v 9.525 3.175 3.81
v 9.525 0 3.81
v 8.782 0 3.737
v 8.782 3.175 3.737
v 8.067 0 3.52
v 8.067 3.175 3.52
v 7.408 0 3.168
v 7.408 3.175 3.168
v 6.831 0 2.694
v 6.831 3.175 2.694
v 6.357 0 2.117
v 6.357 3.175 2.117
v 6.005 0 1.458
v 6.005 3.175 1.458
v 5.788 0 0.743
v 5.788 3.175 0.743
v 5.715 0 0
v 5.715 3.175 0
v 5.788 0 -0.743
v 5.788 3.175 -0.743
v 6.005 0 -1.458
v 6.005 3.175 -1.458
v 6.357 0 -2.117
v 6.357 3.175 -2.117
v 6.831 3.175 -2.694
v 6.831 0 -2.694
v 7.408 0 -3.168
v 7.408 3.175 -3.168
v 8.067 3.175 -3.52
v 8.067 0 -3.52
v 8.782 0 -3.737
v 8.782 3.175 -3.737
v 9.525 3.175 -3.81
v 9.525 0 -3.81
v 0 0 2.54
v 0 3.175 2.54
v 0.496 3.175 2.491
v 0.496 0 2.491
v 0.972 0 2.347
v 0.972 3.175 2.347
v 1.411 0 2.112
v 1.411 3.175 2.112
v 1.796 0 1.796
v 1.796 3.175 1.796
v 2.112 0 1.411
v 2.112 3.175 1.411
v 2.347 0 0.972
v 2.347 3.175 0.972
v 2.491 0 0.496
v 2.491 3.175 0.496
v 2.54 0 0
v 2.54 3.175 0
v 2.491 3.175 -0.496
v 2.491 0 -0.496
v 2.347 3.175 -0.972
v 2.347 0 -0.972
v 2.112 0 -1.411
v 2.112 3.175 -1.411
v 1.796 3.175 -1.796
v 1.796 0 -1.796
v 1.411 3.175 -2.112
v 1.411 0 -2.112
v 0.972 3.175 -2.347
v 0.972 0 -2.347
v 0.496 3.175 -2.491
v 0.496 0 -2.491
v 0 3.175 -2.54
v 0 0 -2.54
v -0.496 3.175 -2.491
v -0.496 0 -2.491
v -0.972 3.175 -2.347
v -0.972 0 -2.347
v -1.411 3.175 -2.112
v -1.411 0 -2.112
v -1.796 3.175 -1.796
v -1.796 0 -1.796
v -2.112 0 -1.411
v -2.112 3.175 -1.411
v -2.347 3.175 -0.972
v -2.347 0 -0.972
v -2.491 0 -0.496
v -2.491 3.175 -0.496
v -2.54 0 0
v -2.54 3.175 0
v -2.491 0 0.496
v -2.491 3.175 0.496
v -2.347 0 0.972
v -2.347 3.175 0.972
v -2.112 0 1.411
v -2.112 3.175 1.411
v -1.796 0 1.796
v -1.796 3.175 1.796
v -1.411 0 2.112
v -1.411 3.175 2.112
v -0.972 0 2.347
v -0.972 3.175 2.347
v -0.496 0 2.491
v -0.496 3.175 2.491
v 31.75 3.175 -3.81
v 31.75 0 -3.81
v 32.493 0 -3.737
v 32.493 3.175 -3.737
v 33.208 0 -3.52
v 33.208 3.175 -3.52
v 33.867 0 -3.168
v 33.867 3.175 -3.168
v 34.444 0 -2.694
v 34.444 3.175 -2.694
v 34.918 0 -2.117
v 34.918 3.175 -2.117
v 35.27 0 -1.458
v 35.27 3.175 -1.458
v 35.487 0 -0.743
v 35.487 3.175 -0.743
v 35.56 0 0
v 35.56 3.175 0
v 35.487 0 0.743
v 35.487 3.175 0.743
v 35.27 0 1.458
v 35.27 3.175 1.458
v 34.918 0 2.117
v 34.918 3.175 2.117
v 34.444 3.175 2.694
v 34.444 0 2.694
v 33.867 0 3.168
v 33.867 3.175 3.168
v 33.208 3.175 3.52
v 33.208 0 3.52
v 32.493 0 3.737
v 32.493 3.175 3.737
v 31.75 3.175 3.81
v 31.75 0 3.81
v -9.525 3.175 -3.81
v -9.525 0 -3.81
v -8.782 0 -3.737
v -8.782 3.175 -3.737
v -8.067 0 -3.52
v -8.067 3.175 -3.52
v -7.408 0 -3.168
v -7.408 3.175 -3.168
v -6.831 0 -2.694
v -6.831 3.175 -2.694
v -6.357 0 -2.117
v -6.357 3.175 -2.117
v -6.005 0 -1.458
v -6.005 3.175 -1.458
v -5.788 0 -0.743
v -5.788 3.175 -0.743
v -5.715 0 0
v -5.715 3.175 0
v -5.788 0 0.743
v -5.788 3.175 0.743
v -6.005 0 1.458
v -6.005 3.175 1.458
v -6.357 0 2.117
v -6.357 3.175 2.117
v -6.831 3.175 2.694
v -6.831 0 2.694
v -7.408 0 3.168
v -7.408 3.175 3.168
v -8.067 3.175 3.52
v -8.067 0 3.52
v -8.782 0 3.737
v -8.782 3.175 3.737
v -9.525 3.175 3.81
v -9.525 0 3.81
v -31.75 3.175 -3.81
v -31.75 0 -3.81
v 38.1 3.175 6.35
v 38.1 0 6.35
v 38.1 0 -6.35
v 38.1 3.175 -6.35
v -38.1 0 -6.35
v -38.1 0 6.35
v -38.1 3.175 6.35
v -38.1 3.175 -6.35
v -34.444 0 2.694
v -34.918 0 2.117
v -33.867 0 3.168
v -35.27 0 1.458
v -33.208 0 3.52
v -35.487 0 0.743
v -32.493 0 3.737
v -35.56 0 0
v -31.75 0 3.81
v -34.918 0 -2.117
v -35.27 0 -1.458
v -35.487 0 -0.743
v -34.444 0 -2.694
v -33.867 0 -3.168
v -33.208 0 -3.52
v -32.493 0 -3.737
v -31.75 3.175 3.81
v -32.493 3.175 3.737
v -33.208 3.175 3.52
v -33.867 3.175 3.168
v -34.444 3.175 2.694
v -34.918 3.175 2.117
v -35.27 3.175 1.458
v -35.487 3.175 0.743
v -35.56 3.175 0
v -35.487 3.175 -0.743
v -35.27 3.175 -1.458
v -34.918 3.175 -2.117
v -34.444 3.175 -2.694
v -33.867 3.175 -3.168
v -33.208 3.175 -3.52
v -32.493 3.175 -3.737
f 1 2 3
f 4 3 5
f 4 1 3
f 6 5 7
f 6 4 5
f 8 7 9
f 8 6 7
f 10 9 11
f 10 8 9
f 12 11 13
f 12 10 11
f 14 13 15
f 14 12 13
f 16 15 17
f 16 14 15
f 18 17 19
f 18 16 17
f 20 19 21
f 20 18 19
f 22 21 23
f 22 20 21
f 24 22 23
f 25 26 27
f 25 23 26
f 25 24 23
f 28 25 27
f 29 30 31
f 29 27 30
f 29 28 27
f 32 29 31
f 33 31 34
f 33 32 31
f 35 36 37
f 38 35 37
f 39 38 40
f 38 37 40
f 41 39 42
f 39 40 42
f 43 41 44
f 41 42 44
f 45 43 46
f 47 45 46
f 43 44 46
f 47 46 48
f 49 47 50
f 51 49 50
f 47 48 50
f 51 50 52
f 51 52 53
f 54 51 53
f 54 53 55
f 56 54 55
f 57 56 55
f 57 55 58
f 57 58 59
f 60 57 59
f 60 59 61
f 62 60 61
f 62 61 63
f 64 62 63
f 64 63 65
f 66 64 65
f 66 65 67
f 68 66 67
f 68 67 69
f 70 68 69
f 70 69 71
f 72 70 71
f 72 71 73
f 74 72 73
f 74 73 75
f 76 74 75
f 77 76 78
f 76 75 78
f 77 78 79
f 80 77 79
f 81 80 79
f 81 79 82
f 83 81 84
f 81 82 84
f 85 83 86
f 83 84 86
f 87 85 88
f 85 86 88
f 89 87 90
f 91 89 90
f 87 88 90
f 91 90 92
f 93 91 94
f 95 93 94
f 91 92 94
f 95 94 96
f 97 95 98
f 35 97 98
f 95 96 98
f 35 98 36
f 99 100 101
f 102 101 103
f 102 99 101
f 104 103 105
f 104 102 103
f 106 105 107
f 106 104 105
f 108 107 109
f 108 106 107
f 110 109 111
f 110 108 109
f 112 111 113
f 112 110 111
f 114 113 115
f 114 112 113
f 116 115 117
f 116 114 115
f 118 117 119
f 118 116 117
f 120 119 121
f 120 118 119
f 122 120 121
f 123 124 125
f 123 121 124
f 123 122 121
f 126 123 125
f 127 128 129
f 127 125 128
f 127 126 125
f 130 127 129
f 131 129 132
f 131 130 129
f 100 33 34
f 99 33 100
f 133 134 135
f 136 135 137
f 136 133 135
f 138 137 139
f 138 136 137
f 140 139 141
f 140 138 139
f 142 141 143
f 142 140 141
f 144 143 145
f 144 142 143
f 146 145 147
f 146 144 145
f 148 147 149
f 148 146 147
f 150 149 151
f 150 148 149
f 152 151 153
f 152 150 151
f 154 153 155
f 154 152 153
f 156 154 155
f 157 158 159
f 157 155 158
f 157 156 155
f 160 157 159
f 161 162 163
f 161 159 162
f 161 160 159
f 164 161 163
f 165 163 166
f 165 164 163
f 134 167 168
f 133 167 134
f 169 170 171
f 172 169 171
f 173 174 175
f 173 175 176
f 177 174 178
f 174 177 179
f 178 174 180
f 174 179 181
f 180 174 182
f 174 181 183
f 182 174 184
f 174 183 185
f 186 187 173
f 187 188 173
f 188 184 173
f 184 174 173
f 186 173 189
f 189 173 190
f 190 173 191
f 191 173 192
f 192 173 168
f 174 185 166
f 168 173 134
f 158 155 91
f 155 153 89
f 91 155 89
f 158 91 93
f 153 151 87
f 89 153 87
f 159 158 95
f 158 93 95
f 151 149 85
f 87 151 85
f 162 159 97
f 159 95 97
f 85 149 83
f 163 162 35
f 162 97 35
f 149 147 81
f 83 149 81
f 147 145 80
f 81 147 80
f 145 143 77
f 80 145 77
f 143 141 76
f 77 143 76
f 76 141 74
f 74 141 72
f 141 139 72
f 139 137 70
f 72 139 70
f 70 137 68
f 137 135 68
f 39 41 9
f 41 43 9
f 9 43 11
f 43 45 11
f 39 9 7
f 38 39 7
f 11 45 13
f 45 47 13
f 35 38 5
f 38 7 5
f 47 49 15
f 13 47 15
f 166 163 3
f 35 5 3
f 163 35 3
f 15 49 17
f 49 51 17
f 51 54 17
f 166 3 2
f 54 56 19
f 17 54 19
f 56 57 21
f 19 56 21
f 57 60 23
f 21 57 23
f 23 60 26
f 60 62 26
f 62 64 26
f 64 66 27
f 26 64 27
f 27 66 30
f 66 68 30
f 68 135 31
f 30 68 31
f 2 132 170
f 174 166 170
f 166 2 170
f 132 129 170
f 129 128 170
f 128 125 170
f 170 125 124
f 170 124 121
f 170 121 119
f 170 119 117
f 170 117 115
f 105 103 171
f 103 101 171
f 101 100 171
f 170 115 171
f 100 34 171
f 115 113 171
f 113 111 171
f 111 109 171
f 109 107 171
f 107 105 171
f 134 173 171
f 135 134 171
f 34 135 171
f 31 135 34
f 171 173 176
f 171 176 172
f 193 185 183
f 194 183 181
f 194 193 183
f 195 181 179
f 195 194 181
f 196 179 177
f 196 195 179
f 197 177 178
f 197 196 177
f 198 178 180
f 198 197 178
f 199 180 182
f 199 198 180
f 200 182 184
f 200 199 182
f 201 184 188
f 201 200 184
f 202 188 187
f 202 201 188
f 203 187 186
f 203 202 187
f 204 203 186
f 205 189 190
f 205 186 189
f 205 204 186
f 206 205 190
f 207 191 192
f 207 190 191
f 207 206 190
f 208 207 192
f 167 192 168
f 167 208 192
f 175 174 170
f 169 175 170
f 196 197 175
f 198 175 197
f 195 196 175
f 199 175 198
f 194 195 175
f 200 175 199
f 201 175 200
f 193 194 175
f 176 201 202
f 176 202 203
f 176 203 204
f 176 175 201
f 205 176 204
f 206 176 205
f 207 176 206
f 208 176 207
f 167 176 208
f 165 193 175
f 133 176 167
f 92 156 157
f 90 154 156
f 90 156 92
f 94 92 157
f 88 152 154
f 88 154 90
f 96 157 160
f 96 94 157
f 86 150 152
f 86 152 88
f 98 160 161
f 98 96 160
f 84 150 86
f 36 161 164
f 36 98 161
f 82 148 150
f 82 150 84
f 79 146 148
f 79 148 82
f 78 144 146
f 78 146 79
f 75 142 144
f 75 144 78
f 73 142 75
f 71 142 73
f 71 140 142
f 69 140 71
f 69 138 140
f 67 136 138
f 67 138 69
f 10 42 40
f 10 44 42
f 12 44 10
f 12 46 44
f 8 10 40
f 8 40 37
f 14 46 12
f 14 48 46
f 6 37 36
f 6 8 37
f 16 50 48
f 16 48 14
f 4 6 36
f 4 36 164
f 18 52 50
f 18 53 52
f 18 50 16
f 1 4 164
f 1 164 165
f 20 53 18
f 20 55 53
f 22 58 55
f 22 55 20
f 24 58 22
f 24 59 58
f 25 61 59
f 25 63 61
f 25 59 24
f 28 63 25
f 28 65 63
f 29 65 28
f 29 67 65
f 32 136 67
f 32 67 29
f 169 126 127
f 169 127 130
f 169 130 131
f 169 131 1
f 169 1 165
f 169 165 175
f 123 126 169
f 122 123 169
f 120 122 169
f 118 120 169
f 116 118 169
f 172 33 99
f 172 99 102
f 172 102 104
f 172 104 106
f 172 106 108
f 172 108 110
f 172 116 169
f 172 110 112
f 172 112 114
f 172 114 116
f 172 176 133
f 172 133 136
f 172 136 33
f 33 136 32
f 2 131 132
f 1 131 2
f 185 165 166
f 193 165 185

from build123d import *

# Parameters (mm, degrees)
SKETCH1_W           = 76.2
SKETCH1_H           = 12.7
BOSS_EXTRUDE1_DEPTH = 3.175
SKETCH2_R           = 2.54
CUT_EXTRUDE1_DEPTH  = 39.75581408
CUT_EXTRUDE2_DEPTH  = 39.75581408


with BuildPart() as part:
    # Sketch1 → Boss-Extrude1 (new body)
    with BuildSketch(Plane(origin=(0, 0, 0), x_dir=(1, 0, 0), z_dir=(0, 1, 0))):
        Rectangle(SKETCH1_W, SKETCH1_H)
    extrude(amount=BOSS_EXTRUDE1_DEPTH)

    # Sketch2 → Cut-Extrude1 (cut, through all)
    with BuildSketch(Plane(origin=(0, 3.175, 0), x_dir=(1, 0, 0), z_dir=(0, 1, 0))):
        with Locations(Location((0, 0, 0), (0, 0, 270))):
            Circle(SKETCH2_R)
    extrude(amount=-CUT_EXTRUDE1_DEPTH, mode=Mode.SUBTRACT)

    # Sketch4 → Cut-Extrude2 (cut, through all)
    with BuildSketch(Plane(origin=(0, 3.175, 0), x_dir=(1, 0, 0), z_dir=(0, 1, 0))):
        with BuildLine():
            Line((-31.75, 3.81), (-9.525, 3.81))
            ThreePointArc((-9.525, 3.81), (-5.715, 0), (-9.525, -3.81))
            Line((-9.525, -3.81), (-31.75, -3.81))
            ThreePointArc((-31.75, -3.81), (-35.56, 0), (-31.75, 3.81))
        make_face()
        with BuildLine():
            Line((9.525, 3.81), (31.75, 3.81))
            ThreePointArc((31.75, 3.81), (35.56, 0), (31.75, -3.81))
            Line((31.75, -3.81), (9.525, -3.81))
            ThreePointArc((9.525, -3.81), (5.715, 0), (9.525, 3.81))
        make_face()
    extrude(amount=-CUT_EXTRUDE2_DEPTH, mode=Mode.SUBTRACT)


solid = part.part
